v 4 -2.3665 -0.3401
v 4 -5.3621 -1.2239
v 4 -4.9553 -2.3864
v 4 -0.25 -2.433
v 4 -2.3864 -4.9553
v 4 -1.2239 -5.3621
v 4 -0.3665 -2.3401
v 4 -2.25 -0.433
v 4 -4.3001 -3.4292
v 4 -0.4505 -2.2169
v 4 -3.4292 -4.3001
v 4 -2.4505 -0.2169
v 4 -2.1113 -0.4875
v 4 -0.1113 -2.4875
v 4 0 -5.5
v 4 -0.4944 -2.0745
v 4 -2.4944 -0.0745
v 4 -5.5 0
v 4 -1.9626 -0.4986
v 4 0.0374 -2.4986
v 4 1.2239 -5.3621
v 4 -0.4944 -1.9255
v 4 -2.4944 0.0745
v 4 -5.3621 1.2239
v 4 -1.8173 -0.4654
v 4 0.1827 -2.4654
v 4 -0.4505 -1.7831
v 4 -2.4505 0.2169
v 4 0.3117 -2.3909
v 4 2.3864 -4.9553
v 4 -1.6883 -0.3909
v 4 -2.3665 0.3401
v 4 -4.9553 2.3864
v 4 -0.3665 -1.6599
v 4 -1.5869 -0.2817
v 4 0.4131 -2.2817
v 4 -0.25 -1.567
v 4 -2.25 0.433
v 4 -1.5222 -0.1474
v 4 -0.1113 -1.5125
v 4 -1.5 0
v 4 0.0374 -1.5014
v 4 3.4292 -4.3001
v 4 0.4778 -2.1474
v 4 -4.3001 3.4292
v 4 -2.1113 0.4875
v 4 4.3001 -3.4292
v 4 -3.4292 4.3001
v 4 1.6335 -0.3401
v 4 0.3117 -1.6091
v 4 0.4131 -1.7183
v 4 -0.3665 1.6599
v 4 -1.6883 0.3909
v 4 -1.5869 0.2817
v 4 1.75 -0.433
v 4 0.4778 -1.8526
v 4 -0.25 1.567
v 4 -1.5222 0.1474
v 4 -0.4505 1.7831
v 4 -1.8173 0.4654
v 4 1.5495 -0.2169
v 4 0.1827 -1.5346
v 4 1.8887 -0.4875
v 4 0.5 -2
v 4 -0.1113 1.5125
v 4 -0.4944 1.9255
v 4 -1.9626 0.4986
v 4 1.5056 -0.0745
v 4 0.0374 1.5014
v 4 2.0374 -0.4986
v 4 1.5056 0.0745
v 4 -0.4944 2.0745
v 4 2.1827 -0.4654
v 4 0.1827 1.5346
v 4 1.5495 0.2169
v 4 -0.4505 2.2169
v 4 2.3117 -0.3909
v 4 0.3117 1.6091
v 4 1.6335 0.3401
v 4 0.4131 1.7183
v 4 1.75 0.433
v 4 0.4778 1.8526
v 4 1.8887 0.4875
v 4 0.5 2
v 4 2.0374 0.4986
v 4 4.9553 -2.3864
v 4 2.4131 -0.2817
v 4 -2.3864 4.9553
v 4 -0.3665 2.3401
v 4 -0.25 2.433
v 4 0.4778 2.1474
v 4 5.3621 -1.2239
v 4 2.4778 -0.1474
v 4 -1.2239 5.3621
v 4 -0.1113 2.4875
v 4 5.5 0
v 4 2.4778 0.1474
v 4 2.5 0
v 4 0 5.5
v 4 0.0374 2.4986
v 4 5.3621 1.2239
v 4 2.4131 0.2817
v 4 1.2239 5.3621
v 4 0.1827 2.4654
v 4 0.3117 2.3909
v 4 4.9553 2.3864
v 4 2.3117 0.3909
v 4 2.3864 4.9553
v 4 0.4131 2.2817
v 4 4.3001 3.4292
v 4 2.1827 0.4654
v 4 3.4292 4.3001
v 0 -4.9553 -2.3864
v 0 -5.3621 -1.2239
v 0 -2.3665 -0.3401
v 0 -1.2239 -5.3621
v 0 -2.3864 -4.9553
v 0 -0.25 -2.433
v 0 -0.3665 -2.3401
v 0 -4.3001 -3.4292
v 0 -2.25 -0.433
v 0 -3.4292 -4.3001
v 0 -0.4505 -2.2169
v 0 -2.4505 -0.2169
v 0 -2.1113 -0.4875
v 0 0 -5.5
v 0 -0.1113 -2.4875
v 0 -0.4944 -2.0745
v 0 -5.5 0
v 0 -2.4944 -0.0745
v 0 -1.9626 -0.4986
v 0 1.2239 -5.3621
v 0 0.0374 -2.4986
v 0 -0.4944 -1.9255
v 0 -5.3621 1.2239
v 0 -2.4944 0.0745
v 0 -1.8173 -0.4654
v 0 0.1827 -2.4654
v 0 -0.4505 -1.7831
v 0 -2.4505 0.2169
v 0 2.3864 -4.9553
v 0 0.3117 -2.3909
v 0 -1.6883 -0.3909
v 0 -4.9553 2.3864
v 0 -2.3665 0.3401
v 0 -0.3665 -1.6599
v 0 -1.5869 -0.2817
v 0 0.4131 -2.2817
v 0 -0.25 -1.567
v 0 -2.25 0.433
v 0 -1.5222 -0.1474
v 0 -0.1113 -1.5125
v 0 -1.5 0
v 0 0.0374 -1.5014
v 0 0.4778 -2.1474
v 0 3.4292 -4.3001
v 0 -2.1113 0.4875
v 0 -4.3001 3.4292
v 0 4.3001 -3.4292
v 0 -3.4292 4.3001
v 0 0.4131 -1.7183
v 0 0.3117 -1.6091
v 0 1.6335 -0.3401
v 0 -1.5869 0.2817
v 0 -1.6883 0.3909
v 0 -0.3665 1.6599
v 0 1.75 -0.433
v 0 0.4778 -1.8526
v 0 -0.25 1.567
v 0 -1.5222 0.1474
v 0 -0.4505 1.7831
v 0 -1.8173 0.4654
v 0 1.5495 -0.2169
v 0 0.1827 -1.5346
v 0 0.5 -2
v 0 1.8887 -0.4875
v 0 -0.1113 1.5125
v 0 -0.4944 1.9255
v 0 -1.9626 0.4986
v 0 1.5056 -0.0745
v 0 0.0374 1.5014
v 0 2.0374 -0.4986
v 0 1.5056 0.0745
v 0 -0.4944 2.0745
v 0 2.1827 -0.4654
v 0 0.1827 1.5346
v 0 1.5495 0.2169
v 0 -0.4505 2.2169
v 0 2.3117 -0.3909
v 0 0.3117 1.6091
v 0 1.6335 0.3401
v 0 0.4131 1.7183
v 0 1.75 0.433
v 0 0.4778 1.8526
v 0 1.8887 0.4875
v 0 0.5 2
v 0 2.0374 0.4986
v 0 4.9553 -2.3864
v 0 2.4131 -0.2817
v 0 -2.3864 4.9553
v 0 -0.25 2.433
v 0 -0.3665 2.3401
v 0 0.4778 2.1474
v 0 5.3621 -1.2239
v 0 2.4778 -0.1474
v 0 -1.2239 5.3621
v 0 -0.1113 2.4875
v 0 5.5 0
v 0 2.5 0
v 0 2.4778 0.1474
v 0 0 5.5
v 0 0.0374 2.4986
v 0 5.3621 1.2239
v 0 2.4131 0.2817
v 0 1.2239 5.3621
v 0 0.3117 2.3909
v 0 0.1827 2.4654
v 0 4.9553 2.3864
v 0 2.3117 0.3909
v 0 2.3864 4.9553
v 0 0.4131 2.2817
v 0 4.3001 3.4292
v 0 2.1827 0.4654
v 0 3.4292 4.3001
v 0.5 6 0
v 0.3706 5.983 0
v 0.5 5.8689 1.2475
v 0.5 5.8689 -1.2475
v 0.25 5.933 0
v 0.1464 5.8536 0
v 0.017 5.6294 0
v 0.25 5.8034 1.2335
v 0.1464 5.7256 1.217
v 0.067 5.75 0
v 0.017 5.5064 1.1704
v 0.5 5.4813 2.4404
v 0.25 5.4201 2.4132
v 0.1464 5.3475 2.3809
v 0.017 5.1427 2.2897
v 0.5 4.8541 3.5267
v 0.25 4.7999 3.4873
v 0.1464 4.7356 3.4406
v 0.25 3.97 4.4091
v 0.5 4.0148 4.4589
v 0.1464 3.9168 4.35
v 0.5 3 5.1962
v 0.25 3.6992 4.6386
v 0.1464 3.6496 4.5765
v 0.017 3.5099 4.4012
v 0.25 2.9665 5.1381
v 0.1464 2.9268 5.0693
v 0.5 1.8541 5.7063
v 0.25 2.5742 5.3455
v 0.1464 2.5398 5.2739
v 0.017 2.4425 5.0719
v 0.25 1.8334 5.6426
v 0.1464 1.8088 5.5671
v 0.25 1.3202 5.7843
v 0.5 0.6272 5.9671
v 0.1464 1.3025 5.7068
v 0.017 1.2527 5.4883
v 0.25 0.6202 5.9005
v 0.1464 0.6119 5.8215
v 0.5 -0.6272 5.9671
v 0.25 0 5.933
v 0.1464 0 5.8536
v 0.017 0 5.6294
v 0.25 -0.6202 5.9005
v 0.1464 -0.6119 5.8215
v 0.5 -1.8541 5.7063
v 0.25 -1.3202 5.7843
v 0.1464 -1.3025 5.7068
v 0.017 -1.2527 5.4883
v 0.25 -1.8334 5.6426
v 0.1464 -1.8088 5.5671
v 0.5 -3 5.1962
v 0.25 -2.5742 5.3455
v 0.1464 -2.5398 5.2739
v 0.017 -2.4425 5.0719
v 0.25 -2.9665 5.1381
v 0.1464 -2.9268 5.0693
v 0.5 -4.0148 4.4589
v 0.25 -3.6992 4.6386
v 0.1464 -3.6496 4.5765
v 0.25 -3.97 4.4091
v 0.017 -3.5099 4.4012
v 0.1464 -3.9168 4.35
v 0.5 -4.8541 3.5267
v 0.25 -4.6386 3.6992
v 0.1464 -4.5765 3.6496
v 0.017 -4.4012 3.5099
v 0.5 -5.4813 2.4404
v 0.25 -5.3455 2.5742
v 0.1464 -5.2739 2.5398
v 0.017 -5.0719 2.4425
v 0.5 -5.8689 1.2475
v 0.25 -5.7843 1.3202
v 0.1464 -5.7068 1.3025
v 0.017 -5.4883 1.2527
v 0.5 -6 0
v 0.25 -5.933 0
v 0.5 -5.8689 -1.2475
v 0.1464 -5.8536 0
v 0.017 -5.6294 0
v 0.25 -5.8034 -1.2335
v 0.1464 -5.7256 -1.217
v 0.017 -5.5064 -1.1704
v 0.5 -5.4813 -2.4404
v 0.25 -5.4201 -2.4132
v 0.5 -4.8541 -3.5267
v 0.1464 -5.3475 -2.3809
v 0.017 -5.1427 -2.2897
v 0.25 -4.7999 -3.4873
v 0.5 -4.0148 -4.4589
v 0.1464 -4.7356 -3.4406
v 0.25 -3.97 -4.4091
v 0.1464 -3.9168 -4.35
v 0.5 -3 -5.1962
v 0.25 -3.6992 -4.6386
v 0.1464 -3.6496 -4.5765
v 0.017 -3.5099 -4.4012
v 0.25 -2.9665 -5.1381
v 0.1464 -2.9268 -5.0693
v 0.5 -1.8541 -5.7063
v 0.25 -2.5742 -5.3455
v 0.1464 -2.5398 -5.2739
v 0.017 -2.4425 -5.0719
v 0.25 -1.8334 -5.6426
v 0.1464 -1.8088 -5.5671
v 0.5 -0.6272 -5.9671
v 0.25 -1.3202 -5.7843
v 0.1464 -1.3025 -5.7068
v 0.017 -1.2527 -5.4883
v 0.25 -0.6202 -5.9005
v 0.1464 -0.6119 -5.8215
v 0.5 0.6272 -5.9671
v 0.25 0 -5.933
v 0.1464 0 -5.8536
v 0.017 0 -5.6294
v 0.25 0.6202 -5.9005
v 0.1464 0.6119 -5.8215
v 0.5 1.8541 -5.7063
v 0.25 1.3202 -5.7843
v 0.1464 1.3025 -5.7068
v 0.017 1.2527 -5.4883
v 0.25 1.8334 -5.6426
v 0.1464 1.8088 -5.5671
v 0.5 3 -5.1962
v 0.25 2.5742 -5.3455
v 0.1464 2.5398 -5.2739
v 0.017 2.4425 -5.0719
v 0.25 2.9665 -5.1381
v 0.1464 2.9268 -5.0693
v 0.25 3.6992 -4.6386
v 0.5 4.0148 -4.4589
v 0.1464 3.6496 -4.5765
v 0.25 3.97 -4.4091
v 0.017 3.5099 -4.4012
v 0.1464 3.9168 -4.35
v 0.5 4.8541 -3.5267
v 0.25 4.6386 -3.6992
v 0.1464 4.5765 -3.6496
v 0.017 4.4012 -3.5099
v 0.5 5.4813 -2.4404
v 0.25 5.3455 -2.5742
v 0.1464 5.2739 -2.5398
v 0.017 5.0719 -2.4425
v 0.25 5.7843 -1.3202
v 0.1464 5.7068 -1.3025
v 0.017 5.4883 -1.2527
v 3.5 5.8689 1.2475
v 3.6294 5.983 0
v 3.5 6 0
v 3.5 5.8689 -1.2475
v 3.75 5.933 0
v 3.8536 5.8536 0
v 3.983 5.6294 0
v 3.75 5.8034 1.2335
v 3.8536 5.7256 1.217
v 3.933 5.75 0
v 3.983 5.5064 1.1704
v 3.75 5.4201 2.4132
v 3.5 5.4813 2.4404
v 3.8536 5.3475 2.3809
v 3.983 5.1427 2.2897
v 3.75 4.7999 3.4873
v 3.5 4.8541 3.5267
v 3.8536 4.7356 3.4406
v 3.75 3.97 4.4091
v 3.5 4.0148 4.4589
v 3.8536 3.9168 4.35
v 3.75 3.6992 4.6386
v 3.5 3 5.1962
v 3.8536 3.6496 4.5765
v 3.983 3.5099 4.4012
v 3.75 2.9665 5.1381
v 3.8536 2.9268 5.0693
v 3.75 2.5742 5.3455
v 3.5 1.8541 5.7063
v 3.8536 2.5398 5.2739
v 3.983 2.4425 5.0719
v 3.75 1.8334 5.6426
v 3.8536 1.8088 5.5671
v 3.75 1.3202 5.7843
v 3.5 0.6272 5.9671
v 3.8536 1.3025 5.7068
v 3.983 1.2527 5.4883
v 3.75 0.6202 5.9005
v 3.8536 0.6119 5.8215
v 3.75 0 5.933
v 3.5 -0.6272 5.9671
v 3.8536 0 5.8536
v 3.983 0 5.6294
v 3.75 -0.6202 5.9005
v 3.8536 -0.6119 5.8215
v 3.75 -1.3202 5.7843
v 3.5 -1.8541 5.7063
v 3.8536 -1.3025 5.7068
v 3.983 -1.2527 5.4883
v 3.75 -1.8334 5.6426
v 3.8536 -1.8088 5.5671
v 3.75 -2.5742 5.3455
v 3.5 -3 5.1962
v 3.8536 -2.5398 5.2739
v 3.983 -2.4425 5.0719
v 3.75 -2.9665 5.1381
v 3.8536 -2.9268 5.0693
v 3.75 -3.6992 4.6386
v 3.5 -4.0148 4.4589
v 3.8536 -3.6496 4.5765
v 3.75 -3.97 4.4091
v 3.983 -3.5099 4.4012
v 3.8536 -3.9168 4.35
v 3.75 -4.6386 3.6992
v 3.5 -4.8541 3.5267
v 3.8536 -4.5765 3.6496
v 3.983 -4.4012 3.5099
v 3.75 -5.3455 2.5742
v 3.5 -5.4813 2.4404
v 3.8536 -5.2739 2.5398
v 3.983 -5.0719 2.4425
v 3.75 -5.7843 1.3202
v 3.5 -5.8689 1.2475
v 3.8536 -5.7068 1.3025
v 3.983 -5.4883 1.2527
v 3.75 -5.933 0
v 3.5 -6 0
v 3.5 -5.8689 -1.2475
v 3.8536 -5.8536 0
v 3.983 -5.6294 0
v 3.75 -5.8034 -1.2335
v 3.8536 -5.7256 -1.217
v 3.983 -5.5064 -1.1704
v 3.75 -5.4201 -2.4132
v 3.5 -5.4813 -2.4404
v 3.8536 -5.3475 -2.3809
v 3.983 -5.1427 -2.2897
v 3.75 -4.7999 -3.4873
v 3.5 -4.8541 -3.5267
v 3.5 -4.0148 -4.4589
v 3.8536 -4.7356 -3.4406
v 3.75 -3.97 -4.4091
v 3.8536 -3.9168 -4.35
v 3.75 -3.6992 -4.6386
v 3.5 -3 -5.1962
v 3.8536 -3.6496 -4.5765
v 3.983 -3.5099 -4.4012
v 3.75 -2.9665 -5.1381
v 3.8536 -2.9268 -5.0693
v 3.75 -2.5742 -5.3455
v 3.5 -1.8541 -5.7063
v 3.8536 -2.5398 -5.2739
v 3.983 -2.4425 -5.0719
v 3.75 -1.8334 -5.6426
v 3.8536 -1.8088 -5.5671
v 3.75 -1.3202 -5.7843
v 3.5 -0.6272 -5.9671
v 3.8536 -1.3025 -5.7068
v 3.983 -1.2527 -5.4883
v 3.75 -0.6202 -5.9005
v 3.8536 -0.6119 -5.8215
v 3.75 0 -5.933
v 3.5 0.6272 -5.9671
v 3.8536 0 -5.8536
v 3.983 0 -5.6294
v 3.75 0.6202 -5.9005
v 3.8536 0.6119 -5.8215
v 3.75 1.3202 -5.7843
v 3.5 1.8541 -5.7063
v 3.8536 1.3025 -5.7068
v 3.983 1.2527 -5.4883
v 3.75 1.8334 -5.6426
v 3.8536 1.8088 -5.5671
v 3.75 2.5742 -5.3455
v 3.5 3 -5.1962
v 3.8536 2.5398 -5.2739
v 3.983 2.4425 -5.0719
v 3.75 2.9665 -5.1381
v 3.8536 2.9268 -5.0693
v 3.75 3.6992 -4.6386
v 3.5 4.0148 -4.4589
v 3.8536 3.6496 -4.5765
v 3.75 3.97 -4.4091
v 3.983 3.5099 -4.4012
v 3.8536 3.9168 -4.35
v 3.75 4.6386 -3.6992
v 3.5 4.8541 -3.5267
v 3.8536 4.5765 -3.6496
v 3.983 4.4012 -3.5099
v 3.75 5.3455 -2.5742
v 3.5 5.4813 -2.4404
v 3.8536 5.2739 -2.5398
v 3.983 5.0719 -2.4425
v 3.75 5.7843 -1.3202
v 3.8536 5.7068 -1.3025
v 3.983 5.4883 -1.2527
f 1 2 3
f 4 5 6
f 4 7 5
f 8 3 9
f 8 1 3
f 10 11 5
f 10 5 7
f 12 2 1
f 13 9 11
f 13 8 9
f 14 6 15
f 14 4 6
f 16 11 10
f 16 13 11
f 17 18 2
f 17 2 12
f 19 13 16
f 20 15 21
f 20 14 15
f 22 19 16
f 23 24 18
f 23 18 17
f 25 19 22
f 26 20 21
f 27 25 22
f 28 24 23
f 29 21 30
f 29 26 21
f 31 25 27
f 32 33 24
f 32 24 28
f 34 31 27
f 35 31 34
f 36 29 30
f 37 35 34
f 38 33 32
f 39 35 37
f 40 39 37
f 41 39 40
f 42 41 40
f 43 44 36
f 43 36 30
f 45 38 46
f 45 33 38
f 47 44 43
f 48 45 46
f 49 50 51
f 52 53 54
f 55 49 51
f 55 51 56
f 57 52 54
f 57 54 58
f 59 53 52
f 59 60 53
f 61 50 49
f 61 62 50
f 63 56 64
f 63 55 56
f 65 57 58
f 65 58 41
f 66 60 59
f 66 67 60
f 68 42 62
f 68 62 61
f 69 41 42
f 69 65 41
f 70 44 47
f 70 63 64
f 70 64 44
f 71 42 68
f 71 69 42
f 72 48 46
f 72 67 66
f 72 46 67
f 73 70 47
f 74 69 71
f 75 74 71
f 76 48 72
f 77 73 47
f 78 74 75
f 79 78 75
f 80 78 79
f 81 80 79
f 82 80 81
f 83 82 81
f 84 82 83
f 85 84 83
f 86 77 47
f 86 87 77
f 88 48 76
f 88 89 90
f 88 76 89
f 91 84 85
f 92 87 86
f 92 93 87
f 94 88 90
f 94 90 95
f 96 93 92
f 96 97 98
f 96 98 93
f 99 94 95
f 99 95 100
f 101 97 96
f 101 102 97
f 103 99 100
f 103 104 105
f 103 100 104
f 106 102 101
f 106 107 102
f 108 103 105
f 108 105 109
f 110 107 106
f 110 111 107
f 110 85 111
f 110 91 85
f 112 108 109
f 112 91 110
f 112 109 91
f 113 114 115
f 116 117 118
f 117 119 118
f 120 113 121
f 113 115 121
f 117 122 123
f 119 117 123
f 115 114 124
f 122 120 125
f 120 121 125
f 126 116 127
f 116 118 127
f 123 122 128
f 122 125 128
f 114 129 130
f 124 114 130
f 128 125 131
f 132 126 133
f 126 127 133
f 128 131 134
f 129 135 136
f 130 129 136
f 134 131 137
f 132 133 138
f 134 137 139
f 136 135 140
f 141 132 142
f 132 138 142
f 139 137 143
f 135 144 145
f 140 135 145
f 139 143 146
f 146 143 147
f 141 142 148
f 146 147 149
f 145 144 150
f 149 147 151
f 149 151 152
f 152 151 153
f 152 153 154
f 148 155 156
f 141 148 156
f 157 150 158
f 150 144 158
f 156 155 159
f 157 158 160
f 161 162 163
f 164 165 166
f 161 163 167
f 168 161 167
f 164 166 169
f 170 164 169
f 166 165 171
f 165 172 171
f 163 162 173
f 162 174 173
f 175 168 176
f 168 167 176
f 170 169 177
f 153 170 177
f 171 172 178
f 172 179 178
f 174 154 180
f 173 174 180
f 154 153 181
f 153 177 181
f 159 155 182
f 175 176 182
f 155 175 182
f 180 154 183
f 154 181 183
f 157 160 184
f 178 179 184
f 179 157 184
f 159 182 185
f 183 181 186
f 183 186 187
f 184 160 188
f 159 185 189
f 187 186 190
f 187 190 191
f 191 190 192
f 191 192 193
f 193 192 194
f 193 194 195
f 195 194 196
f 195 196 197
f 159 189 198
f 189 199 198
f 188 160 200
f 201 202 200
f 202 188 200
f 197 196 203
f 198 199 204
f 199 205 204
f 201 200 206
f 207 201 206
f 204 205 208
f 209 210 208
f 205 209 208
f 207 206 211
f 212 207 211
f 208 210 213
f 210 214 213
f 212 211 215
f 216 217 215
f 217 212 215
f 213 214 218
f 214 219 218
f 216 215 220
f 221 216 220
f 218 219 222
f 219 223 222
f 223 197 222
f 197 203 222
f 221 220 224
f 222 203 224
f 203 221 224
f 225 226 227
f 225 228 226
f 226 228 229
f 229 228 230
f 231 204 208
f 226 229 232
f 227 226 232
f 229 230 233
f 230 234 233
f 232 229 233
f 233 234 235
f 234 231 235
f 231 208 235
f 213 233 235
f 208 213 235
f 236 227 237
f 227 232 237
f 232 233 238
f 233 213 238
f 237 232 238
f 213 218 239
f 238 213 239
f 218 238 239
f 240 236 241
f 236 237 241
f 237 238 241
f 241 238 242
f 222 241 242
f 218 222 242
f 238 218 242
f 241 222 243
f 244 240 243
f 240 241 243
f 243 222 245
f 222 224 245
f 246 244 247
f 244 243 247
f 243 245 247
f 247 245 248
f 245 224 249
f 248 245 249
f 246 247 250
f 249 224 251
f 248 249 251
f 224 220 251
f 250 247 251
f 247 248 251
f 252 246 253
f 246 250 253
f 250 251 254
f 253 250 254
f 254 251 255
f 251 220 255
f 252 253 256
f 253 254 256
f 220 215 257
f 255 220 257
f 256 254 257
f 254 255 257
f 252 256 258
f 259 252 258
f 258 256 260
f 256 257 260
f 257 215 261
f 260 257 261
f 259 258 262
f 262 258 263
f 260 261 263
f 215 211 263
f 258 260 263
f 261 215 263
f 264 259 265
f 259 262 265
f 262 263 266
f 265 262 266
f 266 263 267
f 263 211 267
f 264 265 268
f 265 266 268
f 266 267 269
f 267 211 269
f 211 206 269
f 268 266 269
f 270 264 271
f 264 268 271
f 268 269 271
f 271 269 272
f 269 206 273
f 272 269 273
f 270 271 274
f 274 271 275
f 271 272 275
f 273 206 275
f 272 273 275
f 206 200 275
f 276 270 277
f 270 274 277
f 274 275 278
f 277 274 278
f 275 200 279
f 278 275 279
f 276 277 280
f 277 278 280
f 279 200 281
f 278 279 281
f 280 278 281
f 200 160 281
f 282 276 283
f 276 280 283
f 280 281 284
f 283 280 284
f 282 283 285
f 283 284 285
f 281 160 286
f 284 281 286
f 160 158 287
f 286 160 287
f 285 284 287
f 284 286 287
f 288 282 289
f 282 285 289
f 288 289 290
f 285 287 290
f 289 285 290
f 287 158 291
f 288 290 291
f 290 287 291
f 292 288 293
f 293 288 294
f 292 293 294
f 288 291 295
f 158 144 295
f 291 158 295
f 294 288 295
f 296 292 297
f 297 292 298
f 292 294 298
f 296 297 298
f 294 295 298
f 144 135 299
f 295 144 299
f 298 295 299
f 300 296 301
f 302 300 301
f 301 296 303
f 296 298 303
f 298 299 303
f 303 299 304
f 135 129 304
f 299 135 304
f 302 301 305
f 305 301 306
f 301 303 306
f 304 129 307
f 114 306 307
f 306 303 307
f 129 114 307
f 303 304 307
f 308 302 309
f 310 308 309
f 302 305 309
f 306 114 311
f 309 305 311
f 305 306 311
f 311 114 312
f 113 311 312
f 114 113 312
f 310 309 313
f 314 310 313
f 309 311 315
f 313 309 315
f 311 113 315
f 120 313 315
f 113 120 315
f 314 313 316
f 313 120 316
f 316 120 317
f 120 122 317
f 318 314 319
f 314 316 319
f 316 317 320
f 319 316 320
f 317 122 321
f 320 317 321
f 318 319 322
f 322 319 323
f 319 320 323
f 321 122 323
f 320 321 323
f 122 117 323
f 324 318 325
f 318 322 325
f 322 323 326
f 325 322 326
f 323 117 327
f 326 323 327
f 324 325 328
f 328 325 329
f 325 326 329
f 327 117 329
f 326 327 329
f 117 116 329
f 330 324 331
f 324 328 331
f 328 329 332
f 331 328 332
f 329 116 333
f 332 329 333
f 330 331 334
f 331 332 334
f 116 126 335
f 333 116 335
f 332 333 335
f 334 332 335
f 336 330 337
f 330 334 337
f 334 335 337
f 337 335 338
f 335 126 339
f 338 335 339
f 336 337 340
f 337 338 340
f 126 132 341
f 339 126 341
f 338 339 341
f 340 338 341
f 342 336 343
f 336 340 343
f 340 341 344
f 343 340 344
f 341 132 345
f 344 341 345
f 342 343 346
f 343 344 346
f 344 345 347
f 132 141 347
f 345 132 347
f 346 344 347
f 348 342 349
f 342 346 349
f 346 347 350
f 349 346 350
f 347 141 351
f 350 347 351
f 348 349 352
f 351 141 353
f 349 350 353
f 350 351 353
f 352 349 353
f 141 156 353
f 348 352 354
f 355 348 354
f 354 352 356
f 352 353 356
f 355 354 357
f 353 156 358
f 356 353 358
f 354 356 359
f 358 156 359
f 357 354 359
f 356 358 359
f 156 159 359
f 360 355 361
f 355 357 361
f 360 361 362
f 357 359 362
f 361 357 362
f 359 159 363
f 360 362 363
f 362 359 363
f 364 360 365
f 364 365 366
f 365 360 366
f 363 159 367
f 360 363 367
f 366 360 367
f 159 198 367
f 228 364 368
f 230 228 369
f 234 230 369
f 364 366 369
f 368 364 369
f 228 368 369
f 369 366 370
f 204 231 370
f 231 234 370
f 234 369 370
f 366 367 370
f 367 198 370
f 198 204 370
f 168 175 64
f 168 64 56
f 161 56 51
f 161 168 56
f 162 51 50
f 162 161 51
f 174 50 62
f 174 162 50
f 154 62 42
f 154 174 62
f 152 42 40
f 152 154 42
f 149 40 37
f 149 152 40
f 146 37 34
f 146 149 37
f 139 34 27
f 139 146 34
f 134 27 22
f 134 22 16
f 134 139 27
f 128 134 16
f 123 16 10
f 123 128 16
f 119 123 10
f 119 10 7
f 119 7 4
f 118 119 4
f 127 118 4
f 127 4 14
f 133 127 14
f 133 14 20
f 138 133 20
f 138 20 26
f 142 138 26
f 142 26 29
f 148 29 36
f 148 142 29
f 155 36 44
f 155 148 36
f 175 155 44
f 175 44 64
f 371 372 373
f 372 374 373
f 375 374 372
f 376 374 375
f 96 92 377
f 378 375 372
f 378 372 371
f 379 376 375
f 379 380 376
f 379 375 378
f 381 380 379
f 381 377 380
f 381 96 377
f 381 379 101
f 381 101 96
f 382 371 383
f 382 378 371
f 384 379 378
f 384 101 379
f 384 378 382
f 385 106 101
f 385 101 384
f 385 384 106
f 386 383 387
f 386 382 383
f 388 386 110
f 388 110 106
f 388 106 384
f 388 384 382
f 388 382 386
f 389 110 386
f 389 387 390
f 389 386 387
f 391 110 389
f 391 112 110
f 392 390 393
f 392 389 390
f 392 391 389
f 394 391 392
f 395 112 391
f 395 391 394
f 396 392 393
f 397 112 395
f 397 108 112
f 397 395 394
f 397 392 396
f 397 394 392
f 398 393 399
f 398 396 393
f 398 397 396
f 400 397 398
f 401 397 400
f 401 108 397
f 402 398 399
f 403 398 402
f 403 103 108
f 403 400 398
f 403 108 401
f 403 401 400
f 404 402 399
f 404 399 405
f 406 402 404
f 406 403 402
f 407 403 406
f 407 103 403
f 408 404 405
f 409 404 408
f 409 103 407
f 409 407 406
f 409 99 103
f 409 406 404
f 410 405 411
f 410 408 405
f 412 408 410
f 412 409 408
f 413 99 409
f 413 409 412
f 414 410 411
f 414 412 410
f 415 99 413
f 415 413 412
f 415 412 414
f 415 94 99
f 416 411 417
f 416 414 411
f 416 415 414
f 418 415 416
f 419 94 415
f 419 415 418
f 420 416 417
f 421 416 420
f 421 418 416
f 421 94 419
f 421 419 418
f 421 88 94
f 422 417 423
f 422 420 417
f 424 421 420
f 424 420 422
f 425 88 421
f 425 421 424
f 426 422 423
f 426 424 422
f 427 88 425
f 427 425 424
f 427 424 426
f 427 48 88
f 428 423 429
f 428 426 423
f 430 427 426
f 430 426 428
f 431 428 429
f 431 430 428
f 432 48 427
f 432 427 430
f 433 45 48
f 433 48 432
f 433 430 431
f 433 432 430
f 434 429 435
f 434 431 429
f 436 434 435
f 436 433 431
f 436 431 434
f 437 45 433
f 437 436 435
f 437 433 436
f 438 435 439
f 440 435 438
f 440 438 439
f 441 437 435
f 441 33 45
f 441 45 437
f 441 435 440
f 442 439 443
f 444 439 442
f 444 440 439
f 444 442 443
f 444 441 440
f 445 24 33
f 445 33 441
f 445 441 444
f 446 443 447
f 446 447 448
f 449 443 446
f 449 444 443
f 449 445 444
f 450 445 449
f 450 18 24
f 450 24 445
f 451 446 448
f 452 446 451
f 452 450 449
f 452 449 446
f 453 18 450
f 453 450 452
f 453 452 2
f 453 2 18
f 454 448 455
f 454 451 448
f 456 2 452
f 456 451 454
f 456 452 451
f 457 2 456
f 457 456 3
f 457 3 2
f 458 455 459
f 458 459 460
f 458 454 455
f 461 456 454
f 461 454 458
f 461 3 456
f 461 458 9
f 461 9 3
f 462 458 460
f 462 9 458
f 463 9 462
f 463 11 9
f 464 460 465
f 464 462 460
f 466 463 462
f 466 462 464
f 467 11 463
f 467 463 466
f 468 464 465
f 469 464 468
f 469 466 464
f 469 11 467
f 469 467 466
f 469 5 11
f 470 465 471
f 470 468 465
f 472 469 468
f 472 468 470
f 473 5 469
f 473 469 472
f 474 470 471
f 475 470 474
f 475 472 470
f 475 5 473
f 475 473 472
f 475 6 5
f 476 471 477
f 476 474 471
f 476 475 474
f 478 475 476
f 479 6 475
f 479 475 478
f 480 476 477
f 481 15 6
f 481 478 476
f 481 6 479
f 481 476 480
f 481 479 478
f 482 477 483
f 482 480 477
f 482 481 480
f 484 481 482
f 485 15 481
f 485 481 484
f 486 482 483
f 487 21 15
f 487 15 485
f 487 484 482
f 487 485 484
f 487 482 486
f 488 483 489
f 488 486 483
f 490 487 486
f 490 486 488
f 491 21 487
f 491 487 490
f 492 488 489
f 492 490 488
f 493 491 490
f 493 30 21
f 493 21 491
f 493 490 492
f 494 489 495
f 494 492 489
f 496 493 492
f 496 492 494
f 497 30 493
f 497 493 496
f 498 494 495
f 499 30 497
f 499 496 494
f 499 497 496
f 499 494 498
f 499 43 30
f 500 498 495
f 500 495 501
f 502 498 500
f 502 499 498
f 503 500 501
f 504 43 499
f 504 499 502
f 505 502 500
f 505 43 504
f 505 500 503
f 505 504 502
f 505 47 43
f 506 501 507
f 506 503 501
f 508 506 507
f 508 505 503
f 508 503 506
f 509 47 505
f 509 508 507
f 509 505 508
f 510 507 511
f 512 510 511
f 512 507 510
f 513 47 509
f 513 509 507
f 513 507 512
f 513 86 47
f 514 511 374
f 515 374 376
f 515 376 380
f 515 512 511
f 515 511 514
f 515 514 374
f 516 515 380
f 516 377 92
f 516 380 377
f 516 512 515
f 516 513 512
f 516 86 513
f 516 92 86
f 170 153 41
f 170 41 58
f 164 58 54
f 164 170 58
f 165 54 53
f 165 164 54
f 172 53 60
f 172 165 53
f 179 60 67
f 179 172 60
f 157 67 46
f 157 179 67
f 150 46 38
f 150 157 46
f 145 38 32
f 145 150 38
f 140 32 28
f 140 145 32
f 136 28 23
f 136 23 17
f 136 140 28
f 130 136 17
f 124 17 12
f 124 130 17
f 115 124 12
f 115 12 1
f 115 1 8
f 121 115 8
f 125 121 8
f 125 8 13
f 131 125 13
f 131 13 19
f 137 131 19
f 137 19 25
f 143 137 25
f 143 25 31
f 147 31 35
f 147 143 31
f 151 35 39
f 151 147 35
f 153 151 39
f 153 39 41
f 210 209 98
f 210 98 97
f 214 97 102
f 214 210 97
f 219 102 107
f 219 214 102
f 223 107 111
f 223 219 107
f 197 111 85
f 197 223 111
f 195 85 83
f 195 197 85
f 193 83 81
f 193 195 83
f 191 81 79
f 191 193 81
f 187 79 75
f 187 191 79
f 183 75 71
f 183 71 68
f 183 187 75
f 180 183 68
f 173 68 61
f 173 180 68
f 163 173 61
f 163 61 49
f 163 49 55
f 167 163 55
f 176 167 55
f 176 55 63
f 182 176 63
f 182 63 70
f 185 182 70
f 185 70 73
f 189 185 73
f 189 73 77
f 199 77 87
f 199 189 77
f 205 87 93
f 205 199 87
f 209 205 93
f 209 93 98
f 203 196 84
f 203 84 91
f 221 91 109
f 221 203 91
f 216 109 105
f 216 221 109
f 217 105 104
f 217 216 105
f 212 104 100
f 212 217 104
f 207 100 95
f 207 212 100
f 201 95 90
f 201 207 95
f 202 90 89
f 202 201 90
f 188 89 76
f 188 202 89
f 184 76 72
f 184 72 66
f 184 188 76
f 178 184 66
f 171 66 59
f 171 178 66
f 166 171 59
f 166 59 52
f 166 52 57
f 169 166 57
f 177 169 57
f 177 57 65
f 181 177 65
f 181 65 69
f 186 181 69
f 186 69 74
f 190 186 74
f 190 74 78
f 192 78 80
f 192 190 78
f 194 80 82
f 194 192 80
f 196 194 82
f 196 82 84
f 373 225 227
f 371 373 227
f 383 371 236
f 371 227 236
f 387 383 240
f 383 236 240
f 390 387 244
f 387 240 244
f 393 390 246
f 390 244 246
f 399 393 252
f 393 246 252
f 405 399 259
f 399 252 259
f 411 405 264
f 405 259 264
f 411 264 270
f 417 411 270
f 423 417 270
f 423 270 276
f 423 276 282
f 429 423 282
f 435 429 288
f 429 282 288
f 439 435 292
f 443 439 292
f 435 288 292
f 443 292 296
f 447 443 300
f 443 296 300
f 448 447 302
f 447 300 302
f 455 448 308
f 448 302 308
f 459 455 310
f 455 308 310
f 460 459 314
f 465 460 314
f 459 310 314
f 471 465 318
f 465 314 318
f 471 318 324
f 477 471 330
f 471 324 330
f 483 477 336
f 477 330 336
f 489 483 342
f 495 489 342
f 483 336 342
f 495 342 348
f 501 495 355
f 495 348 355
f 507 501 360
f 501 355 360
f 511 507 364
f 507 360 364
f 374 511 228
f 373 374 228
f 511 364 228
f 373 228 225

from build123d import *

# Parameters (mm, degrees)
F0_R     = 6
F0_R_2   = 0.5
F1_DEPTH = 4
F2_R     = 0.5


with BuildPart() as f1:
    # F0 (on Right) → F1 (new body)
    with BuildSketch(Plane.YZ):
        Circle(F0_R)
        with Locations((0, -2)):
            Circle(F0_R_2, mode=Mode.SUBTRACT)
        with Locations((-2, 0)):
            Circle(F0_R_2, mode=Mode.SUBTRACT)
        with Locations((2, 0)):
            Circle(F0_R_2, mode=Mode.SUBTRACT)
        with Locations((0, 2)):
            Circle(F0_R_2, mode=Mode.SUBTRACT)
    extrude(amount=F1_DEPTH)

    # F2
    f2_edges = [f1.edges().sort_by_distance(p)[0] for p in [
        (4, -6, 0),
        (0, -6, 0),
    ]]
    fillet(f2_edges, radius=F2_R)


solid = f1.part
